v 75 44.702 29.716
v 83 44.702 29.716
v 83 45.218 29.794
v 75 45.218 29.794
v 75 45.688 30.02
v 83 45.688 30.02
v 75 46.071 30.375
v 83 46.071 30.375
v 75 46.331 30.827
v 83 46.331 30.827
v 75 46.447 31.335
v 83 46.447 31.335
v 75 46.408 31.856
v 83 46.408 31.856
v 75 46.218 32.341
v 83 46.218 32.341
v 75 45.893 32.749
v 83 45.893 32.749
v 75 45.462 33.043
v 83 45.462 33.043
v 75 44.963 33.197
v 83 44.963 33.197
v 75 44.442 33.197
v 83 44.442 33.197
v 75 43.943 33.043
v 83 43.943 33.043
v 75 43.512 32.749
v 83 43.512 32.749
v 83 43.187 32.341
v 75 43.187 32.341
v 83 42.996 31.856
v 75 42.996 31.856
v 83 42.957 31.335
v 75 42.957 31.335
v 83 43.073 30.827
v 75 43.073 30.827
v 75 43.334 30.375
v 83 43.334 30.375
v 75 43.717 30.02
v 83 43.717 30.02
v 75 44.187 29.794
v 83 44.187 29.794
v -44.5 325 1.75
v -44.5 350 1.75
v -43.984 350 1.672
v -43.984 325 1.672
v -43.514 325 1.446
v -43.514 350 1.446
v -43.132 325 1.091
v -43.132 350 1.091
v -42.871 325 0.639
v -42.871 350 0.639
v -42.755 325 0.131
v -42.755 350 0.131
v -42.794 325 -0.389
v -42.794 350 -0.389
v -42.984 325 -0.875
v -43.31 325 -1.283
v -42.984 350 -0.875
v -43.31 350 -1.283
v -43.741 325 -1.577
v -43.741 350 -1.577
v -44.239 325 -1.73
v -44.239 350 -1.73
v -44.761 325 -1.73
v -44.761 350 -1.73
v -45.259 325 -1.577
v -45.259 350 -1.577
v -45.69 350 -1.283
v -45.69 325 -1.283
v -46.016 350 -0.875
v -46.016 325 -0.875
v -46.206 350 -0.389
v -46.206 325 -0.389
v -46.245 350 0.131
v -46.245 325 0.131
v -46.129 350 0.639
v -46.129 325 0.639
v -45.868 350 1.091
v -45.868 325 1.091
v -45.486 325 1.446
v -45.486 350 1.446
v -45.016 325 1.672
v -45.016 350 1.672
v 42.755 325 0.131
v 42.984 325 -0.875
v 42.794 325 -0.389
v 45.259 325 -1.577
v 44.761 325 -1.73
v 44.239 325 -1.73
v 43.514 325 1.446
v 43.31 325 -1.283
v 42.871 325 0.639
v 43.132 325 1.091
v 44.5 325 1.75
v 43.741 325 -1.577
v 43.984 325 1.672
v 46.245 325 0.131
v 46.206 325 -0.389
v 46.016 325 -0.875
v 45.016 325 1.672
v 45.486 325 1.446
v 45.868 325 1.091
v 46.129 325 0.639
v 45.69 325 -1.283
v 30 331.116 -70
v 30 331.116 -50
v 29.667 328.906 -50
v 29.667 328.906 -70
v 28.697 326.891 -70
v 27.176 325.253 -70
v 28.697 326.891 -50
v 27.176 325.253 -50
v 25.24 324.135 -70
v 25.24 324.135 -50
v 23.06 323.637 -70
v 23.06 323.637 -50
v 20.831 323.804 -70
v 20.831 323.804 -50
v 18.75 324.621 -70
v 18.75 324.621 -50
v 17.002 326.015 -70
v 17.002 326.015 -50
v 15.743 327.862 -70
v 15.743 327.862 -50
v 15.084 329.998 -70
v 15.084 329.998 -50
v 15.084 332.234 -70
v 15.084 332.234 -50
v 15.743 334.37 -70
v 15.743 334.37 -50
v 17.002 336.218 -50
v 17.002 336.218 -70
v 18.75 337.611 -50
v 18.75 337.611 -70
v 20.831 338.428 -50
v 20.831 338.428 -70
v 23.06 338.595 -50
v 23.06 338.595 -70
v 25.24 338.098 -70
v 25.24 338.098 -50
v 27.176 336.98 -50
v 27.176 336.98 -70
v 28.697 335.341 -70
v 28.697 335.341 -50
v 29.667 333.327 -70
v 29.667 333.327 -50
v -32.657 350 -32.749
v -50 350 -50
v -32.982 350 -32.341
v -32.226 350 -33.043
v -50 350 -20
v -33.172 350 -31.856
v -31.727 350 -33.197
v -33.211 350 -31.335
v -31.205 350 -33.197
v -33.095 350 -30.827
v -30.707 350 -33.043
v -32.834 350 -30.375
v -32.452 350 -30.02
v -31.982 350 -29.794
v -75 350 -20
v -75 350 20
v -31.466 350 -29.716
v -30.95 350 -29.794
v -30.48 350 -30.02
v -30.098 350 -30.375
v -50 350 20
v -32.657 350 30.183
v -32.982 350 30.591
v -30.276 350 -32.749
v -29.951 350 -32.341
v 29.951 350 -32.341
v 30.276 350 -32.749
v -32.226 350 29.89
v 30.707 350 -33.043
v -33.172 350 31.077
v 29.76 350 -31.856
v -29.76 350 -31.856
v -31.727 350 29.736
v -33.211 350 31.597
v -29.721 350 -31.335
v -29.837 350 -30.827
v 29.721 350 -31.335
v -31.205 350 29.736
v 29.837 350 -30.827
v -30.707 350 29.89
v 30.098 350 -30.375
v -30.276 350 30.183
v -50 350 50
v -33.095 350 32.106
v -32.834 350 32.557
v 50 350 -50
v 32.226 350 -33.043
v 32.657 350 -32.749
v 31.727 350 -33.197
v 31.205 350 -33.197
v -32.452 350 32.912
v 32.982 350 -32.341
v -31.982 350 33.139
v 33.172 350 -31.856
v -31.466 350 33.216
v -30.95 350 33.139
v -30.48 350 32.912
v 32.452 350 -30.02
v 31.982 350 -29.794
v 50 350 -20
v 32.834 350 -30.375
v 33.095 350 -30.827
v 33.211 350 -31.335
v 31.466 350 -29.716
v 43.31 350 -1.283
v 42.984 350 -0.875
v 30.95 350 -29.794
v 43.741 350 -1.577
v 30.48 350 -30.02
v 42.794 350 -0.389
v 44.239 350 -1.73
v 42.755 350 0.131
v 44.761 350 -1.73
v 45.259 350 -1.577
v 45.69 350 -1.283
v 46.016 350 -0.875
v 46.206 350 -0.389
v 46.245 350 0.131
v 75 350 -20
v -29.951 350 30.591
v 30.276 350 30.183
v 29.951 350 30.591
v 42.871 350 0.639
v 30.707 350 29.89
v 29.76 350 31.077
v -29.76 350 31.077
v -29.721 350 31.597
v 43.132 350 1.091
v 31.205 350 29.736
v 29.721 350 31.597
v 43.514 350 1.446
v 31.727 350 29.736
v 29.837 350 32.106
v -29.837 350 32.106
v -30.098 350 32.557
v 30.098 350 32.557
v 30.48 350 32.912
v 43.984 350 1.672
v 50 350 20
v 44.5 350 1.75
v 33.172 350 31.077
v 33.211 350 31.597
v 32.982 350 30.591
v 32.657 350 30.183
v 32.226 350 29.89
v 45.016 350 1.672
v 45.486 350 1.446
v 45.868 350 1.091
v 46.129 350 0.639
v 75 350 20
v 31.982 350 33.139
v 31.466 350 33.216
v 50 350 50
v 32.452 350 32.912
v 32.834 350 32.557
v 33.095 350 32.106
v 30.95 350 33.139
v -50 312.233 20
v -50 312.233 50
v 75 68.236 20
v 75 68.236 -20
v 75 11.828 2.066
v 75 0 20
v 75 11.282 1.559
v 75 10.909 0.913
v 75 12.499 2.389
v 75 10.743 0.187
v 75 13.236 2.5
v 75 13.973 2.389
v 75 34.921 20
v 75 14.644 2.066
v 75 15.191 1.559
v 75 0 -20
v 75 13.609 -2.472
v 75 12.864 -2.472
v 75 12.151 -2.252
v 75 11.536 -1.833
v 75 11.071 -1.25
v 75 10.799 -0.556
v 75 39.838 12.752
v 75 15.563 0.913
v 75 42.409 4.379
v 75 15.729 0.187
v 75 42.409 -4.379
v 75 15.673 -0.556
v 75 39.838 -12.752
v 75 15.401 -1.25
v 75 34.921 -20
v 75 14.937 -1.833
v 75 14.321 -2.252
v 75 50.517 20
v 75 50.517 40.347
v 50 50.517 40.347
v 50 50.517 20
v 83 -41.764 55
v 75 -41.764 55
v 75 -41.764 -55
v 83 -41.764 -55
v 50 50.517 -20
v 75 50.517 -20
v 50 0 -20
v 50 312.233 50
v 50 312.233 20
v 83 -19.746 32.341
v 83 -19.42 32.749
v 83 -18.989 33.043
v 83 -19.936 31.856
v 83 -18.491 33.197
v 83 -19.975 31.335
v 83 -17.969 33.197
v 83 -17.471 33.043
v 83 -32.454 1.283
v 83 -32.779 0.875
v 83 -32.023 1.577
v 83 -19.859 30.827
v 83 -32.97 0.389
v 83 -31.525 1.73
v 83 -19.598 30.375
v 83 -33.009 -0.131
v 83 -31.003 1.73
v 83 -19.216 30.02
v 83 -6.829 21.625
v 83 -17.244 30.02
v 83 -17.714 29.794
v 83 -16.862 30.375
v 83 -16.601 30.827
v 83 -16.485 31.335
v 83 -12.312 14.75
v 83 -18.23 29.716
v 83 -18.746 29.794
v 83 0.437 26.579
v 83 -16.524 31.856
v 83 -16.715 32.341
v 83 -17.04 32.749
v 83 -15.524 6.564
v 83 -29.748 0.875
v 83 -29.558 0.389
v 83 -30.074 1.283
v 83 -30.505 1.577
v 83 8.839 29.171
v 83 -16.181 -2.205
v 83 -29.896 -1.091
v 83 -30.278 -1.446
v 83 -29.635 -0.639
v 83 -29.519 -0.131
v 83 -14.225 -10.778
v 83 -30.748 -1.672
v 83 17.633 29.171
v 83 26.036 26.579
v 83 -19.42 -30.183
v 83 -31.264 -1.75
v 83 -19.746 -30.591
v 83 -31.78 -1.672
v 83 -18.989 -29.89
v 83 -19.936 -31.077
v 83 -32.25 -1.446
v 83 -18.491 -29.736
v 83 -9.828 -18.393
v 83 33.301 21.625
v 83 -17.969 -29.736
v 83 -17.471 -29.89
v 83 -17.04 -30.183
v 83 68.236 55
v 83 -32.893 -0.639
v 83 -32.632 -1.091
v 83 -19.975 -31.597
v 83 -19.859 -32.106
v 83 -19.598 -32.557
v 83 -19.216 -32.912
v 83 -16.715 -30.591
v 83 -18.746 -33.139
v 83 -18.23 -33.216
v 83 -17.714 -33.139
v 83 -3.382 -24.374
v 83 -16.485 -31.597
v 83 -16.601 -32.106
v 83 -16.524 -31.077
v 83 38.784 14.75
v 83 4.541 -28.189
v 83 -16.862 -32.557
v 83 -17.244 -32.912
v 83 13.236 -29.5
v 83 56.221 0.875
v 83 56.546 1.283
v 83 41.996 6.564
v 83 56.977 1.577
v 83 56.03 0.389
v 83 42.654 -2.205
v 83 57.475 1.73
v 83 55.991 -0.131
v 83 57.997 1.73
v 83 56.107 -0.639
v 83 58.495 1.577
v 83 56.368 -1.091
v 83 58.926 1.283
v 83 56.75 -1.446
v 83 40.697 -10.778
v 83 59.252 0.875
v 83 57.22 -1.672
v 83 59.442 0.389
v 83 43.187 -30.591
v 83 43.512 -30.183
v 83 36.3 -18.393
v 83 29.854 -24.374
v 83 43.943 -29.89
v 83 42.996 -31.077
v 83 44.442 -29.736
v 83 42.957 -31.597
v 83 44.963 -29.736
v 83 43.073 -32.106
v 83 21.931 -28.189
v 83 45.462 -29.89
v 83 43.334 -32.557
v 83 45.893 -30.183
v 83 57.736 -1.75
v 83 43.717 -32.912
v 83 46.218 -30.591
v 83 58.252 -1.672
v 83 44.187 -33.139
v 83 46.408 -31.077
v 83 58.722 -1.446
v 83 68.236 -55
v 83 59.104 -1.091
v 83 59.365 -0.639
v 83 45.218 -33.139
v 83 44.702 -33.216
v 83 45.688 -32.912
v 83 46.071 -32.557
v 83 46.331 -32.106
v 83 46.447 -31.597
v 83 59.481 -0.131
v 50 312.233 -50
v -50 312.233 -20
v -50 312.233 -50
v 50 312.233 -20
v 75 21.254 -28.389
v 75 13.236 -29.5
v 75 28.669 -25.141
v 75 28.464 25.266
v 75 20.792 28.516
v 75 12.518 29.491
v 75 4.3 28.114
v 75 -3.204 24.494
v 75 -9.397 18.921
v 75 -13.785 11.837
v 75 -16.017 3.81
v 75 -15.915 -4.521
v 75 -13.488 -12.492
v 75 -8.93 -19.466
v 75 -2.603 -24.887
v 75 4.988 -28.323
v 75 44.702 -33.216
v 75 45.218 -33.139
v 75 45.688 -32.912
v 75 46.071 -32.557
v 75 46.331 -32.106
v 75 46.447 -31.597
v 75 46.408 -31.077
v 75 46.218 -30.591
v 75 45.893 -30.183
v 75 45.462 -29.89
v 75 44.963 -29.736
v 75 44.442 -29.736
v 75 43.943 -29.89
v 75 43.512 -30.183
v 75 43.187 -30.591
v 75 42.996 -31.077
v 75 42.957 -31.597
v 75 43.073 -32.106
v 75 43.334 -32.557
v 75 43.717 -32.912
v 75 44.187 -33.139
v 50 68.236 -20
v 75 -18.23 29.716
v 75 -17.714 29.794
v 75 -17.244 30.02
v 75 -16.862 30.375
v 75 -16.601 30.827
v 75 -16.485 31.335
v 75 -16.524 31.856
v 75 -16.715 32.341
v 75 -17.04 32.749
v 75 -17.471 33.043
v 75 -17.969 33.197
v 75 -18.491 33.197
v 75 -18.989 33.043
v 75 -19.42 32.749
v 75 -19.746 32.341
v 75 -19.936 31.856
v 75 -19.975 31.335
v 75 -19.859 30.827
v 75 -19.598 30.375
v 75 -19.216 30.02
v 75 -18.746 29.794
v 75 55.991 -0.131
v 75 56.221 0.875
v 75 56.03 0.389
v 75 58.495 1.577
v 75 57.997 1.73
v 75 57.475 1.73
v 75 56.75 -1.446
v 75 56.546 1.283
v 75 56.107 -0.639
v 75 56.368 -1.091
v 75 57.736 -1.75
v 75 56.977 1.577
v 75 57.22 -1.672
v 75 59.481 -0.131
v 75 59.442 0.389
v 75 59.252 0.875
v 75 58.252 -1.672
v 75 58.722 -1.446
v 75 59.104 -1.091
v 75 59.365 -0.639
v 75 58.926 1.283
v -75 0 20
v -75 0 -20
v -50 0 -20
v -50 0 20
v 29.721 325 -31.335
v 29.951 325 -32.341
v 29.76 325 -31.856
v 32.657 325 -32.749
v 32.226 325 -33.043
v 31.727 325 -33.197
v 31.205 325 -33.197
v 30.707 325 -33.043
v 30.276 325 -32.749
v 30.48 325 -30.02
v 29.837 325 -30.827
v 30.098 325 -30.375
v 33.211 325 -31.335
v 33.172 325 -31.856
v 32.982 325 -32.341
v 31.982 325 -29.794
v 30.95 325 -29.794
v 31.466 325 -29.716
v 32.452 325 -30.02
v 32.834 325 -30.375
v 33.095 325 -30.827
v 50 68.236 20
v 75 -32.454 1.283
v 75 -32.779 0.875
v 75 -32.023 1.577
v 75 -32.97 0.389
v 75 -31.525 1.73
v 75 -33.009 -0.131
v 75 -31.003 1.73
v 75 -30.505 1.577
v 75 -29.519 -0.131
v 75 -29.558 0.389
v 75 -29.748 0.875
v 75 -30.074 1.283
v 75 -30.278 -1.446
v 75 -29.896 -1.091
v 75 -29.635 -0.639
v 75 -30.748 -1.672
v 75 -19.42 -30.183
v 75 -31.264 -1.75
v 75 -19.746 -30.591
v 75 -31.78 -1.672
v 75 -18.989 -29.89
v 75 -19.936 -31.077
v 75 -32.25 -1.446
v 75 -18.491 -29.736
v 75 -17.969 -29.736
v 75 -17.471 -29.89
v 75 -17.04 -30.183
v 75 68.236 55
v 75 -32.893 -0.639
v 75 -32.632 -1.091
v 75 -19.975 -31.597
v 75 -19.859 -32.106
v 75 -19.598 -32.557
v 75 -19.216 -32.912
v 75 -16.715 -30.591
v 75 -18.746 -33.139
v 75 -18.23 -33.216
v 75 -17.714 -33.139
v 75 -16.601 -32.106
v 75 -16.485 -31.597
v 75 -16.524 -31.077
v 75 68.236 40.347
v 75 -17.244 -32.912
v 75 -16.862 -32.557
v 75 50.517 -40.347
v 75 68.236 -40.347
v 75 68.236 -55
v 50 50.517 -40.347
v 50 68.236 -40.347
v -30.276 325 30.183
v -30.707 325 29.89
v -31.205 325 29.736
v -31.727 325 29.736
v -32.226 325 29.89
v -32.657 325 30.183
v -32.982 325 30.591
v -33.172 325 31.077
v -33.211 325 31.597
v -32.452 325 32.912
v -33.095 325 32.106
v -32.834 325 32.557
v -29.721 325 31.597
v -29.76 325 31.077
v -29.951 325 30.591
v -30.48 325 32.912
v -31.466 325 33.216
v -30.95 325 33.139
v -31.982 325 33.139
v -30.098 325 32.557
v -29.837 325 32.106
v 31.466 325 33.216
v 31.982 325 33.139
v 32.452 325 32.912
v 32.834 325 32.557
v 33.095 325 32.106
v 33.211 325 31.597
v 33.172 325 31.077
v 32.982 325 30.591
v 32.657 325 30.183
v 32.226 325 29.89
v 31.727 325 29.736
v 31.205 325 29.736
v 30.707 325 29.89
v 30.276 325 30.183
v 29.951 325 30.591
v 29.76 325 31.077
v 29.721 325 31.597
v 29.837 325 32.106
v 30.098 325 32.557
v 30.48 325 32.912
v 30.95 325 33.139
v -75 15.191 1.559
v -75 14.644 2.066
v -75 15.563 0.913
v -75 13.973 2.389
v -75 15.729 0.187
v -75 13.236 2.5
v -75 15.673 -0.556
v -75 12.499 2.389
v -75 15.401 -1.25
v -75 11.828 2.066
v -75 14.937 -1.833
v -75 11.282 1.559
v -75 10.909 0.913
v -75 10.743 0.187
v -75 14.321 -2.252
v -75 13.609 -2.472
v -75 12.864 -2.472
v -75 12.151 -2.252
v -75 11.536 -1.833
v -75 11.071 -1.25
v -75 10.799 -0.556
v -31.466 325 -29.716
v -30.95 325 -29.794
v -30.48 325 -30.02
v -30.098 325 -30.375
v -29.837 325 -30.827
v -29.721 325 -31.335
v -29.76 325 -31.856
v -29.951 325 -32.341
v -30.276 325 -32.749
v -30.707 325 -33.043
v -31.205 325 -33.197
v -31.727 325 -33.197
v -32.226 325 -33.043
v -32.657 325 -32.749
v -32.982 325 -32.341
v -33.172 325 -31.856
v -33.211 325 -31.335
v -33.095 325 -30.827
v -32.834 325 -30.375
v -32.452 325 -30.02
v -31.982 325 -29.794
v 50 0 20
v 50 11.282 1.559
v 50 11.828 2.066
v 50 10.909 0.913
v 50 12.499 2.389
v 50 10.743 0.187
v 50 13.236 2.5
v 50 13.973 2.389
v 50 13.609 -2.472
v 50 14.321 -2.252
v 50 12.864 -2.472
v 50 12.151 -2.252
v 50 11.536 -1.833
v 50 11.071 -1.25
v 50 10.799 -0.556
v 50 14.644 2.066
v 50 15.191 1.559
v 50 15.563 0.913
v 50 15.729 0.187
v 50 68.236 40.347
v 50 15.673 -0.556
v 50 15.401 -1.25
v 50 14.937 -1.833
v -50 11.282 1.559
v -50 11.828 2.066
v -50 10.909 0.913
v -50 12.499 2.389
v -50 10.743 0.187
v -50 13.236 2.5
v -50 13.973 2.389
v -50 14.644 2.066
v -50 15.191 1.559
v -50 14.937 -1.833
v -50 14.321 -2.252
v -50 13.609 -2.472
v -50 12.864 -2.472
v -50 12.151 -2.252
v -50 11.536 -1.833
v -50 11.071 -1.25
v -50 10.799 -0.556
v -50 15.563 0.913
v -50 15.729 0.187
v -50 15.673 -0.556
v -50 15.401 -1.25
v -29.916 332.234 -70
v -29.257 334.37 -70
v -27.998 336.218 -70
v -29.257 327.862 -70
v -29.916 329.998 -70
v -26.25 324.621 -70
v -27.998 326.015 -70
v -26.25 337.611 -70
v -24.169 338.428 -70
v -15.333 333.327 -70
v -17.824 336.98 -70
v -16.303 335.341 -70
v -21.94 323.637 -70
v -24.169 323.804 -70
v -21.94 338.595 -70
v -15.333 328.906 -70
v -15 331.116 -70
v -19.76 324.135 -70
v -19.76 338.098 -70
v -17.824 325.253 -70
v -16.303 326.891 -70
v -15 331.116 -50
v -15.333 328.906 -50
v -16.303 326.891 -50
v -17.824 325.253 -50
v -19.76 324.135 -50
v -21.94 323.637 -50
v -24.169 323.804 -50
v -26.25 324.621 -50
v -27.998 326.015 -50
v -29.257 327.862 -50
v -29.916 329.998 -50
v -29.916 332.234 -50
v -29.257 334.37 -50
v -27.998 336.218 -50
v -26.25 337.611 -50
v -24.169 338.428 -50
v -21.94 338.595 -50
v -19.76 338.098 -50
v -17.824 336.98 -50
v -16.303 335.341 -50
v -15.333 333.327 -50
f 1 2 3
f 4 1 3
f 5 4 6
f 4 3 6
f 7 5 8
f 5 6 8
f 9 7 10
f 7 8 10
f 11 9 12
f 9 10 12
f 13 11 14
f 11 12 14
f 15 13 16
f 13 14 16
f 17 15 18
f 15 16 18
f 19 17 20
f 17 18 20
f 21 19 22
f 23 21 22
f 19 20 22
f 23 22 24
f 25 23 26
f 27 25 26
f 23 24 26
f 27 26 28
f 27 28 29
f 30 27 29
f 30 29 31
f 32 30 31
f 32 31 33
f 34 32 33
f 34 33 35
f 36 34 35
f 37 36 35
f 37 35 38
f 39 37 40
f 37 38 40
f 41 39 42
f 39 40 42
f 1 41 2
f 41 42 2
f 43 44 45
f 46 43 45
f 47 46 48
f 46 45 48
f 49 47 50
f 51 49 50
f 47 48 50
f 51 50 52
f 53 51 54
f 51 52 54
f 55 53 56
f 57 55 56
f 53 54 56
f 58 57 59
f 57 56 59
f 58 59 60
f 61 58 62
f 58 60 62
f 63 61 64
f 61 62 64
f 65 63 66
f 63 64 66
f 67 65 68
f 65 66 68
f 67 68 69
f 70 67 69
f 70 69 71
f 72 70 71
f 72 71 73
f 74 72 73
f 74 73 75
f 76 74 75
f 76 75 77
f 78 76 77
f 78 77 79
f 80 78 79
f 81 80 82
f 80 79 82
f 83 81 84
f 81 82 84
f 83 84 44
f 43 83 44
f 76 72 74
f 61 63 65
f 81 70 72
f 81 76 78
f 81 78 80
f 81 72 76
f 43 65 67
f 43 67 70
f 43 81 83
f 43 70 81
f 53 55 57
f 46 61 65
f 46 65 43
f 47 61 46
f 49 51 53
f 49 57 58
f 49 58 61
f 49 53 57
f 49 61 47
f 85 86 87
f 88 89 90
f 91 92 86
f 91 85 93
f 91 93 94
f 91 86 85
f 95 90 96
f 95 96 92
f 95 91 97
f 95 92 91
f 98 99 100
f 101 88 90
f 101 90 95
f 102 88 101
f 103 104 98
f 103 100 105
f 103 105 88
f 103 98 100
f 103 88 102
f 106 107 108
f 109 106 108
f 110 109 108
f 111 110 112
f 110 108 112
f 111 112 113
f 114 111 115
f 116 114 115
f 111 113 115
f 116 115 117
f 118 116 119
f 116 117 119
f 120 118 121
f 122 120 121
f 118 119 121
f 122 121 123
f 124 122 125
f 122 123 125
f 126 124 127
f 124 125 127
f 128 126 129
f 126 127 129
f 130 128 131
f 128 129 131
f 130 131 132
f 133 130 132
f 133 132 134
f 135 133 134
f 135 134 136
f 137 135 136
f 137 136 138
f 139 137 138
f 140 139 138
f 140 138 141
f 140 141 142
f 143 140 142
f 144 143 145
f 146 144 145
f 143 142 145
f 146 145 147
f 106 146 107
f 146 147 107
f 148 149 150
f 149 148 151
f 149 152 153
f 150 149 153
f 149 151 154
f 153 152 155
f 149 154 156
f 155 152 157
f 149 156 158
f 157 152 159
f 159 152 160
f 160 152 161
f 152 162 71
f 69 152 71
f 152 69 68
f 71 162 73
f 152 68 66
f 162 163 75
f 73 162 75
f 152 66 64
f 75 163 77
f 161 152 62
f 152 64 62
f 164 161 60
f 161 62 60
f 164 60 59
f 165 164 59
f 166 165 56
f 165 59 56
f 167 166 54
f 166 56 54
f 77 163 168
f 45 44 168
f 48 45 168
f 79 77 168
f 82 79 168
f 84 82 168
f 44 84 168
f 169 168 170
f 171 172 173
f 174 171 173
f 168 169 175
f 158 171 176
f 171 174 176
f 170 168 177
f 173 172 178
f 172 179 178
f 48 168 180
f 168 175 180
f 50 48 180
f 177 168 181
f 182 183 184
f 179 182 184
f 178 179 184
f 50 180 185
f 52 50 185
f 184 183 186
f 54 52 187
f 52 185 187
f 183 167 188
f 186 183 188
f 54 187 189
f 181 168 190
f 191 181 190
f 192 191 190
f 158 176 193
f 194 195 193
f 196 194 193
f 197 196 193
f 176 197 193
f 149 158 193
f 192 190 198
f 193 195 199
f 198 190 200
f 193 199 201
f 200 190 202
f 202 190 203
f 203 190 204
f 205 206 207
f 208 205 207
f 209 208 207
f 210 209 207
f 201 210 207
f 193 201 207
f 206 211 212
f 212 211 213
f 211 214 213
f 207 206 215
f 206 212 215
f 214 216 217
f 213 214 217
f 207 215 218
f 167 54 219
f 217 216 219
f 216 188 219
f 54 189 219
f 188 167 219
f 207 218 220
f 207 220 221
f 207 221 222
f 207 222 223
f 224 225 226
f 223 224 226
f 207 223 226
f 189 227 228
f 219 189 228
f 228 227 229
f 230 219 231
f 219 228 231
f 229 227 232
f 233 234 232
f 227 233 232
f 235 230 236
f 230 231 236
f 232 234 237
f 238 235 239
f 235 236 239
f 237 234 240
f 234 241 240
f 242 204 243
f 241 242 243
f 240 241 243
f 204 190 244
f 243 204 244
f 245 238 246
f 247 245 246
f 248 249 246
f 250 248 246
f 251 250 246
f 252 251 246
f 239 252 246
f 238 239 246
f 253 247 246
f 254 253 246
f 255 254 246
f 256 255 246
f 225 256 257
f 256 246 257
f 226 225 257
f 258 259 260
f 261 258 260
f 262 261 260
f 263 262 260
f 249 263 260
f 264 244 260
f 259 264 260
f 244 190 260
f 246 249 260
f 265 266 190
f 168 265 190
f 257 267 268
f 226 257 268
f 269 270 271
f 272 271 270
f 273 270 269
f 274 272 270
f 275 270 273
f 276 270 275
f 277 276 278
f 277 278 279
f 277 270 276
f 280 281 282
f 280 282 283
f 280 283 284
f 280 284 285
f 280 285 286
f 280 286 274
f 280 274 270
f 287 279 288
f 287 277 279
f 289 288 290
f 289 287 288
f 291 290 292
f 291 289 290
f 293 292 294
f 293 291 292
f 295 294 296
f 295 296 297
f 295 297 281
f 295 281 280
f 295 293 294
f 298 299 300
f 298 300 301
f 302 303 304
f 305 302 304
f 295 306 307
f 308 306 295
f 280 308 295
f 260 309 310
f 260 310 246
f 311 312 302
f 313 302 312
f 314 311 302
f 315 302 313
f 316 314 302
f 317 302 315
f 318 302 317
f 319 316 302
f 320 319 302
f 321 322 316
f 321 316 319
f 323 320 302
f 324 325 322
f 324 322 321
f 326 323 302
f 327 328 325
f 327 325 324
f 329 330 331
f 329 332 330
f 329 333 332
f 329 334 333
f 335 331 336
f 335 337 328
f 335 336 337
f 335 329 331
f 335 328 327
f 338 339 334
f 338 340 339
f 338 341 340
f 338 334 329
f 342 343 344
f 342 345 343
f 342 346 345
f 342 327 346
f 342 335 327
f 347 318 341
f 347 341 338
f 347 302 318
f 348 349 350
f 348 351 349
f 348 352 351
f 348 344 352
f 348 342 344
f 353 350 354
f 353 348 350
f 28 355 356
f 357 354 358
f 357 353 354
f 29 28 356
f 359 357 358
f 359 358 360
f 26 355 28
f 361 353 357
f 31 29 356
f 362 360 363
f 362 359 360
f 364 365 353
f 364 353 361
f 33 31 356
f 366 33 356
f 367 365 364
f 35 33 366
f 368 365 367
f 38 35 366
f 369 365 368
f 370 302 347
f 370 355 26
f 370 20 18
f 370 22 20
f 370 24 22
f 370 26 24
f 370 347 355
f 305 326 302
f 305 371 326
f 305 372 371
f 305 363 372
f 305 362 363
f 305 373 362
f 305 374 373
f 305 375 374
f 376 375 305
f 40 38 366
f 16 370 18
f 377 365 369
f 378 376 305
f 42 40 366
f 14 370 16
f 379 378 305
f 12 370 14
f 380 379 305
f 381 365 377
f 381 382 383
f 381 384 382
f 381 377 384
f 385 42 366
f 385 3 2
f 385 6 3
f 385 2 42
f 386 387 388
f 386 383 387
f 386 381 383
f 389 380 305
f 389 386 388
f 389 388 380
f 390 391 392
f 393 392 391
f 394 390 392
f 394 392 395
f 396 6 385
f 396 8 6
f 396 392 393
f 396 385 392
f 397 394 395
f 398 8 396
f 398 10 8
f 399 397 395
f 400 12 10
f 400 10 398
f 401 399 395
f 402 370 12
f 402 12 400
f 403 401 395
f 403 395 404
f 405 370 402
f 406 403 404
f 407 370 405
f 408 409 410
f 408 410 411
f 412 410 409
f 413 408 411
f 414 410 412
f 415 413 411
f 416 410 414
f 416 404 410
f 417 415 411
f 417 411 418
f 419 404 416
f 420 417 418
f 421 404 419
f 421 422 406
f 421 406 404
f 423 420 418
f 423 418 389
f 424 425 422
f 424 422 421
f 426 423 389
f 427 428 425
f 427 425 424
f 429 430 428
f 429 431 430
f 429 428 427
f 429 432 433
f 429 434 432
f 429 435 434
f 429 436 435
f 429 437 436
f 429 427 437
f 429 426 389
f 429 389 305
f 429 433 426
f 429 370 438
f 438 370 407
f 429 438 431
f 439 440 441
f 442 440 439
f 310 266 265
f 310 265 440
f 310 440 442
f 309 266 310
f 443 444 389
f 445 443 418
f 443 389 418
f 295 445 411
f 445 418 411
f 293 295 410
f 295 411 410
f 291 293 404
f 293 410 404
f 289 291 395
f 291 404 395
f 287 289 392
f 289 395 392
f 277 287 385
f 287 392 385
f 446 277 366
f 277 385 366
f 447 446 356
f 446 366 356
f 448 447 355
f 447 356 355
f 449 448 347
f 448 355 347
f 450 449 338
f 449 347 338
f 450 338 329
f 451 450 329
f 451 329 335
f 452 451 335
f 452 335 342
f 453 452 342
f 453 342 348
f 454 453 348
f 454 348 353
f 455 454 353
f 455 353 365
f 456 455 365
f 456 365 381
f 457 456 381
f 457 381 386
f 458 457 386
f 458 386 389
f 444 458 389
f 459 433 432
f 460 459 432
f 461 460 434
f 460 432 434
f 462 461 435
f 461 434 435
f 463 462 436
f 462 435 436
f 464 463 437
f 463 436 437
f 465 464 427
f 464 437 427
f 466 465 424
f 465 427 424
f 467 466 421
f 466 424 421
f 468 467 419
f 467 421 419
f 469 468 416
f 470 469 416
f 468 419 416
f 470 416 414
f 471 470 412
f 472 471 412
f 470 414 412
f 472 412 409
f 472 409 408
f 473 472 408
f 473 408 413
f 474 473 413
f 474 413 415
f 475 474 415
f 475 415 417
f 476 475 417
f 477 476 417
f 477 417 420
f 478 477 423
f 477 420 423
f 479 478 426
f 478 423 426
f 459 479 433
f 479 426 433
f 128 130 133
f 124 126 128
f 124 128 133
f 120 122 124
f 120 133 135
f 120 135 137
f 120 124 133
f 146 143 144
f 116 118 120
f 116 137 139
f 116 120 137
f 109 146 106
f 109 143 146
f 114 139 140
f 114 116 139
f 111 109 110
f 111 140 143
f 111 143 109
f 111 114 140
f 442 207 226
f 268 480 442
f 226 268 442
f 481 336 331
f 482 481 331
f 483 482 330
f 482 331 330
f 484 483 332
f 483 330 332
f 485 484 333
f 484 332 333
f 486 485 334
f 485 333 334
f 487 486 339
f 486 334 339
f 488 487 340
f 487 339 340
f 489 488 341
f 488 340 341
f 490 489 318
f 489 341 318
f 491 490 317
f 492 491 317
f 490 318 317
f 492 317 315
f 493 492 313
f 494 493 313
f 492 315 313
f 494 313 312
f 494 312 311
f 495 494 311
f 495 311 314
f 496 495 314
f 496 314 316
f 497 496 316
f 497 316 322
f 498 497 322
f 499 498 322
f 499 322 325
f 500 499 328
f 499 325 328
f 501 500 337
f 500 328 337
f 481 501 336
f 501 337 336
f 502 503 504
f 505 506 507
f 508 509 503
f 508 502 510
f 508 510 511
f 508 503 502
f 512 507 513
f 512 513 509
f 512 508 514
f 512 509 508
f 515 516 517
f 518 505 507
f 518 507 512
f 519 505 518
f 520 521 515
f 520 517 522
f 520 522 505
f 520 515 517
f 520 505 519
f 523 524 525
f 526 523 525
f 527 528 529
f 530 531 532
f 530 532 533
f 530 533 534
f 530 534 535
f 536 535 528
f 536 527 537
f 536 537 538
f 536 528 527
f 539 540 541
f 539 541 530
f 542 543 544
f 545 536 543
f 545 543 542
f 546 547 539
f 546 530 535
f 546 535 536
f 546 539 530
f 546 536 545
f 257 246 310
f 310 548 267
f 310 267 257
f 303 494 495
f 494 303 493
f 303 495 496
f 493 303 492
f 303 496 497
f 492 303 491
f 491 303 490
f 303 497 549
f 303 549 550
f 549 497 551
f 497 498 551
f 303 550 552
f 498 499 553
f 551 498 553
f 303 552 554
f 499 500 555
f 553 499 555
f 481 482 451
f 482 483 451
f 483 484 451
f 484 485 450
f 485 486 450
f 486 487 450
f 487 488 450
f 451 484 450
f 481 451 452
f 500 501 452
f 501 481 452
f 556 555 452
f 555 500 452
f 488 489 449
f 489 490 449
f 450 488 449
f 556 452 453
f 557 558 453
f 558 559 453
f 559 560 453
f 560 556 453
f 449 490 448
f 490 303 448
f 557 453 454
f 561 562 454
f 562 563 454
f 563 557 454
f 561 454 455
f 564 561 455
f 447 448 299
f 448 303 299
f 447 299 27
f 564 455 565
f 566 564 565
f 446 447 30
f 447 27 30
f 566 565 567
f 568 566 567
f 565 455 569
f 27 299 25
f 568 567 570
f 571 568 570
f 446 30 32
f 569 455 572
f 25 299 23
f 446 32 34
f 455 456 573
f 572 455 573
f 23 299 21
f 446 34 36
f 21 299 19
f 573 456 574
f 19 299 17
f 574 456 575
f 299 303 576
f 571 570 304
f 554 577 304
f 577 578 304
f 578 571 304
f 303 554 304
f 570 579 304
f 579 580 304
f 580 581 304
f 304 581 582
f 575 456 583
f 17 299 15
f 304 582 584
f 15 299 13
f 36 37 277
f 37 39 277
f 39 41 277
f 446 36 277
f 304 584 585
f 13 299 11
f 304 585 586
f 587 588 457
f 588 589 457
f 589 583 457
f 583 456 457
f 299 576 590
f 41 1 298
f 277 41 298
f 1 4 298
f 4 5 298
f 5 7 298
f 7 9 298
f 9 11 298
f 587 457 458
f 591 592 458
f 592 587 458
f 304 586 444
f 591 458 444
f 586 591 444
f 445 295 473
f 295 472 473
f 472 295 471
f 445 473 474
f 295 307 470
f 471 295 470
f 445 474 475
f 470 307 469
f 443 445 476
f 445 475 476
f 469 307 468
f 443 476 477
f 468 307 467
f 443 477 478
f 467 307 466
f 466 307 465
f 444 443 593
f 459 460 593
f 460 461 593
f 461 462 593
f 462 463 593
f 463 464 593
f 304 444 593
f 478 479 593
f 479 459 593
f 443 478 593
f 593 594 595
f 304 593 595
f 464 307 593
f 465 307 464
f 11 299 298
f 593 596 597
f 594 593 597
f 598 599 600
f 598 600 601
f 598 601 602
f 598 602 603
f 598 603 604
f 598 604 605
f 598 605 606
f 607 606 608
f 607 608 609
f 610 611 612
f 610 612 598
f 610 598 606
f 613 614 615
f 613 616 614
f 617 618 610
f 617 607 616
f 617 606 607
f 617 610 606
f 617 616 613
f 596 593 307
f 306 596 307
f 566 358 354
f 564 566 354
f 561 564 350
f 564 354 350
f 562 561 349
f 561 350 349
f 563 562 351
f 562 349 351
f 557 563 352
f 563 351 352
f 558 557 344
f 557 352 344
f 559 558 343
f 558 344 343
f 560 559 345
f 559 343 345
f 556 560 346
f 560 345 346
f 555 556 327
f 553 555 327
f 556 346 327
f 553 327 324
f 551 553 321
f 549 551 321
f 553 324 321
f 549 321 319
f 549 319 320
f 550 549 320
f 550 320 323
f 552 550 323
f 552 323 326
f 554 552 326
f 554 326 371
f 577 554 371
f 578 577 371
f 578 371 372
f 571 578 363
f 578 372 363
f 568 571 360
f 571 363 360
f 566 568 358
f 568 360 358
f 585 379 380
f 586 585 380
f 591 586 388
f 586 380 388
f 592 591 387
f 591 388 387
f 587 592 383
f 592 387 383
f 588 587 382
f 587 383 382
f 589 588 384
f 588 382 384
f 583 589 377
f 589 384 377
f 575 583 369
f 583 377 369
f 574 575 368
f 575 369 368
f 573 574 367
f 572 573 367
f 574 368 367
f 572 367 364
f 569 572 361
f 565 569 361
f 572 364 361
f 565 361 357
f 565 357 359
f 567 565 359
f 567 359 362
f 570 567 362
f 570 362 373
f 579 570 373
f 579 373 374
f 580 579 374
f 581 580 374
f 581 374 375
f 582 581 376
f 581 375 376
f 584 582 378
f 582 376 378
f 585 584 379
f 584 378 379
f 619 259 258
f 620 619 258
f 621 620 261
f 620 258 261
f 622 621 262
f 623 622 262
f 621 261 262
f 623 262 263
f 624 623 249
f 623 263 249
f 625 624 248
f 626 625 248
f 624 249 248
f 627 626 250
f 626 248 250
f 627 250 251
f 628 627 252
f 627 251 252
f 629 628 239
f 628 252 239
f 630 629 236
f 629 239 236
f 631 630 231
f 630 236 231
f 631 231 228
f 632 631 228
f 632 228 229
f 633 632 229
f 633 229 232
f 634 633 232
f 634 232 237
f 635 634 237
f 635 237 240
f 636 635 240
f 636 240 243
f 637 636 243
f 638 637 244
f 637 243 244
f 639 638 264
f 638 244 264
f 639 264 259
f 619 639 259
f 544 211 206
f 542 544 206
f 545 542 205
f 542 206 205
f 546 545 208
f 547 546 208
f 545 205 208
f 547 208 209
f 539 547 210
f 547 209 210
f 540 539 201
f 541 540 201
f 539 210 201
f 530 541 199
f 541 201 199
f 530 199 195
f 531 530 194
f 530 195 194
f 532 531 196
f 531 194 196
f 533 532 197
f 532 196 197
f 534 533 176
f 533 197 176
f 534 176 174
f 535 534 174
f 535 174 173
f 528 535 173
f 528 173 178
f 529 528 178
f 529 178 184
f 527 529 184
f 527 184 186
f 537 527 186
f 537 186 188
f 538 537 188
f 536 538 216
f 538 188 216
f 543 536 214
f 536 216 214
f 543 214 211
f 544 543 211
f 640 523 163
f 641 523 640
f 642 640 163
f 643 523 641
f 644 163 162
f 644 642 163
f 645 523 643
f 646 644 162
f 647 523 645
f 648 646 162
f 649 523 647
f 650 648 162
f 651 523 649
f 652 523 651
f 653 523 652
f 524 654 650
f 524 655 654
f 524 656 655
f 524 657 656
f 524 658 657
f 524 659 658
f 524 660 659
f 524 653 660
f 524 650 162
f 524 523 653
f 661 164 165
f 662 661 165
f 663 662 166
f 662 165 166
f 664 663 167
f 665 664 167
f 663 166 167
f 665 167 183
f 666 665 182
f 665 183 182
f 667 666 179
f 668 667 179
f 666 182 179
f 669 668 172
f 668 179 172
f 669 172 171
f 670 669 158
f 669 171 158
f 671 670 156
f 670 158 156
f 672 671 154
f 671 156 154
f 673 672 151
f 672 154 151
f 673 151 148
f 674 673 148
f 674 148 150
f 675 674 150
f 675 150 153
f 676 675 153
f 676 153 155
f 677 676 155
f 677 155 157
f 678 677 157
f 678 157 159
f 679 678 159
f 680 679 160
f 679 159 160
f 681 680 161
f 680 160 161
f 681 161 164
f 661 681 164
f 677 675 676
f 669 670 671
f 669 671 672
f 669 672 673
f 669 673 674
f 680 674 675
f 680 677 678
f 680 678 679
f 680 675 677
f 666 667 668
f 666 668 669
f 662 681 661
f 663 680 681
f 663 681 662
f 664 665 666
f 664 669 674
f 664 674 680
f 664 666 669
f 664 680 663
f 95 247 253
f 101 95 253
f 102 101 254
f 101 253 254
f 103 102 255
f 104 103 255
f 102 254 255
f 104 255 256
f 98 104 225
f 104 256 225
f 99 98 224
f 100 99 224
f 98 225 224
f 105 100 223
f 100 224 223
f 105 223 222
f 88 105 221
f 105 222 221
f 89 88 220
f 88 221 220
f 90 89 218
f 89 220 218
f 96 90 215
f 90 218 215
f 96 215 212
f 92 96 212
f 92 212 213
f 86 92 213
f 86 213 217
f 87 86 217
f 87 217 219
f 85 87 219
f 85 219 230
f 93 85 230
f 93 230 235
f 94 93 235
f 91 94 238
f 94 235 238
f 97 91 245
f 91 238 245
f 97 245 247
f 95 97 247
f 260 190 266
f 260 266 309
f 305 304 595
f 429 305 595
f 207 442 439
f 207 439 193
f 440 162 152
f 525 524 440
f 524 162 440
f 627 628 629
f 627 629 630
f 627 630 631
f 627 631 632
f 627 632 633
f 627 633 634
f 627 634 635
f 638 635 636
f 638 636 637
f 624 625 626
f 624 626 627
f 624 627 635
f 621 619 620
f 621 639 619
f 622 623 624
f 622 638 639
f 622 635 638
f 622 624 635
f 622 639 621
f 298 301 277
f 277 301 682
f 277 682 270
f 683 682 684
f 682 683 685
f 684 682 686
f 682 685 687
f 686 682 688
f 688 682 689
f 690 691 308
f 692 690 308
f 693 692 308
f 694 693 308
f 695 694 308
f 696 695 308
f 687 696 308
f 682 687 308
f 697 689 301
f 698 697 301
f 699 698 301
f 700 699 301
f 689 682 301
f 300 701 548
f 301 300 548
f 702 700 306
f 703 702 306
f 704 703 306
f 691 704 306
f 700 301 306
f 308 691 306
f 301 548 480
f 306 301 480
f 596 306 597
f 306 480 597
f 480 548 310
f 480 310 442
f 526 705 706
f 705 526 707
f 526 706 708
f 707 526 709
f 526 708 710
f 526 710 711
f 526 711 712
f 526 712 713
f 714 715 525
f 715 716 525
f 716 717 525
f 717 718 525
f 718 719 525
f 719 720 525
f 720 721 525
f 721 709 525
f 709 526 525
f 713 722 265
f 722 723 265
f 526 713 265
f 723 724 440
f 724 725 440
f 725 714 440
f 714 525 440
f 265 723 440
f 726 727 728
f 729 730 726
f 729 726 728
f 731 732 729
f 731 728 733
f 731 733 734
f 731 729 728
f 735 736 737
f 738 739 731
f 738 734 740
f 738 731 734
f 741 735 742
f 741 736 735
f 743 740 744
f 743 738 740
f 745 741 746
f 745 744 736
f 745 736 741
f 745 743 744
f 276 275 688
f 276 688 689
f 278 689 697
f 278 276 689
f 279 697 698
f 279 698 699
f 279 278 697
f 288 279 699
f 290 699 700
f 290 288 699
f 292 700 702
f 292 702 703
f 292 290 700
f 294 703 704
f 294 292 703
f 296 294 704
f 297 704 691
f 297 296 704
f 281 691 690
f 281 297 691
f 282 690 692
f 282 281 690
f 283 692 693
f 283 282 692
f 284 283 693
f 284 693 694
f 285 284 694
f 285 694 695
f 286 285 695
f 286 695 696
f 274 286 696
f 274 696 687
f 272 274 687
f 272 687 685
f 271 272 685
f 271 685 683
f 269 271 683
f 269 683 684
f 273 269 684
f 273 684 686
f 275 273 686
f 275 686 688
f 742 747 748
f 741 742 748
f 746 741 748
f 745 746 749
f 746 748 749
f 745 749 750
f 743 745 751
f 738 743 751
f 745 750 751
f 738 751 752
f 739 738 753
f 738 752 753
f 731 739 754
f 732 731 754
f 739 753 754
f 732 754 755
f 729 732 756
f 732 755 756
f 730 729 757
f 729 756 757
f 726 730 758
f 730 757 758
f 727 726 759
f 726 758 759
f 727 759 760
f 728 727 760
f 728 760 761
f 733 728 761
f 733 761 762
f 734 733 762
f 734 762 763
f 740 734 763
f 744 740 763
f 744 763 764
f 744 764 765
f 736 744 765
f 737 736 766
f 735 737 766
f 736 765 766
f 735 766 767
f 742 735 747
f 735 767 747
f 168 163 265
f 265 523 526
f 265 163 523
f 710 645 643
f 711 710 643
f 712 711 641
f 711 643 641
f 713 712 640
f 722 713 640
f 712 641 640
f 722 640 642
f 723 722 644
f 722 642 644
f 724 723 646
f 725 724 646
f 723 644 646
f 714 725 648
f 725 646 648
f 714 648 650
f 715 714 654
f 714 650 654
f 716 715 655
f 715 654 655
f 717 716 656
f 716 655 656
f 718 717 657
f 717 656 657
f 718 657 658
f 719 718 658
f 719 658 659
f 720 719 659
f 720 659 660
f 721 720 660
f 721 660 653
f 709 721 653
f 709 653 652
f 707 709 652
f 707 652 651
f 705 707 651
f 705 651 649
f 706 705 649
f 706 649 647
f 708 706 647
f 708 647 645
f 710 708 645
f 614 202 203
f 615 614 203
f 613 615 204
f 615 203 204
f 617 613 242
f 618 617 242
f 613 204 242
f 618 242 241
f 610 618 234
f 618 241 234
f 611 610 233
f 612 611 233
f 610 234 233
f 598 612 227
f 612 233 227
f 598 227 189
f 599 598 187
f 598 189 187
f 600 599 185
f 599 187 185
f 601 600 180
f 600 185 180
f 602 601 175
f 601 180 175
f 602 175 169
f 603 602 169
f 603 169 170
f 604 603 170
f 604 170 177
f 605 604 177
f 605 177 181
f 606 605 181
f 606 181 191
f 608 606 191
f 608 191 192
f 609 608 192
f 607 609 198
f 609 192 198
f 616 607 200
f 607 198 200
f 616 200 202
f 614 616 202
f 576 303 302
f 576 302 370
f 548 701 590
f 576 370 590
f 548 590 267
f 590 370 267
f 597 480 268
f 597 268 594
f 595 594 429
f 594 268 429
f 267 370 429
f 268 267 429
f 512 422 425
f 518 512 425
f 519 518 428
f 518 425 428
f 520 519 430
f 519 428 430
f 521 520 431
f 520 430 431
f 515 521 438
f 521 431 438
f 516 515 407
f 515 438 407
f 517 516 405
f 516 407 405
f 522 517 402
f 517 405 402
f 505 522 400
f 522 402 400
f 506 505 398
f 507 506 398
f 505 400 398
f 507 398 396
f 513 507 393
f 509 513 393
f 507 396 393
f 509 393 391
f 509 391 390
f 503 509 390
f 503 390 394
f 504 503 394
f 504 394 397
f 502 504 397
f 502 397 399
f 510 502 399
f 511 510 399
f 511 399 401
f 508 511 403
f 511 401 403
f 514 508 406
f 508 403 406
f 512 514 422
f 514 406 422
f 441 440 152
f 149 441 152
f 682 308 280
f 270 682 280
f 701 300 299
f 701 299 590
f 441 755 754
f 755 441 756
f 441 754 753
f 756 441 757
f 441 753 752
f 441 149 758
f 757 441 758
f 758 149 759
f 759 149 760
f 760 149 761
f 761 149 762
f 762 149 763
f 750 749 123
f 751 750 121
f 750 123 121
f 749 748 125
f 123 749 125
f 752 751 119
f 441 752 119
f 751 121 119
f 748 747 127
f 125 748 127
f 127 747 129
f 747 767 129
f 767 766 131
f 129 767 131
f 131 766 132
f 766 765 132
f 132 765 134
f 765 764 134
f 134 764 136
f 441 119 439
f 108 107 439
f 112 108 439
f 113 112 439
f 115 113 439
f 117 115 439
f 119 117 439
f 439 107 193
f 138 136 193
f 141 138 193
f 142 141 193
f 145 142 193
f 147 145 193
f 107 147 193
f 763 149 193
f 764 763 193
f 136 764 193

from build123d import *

# Parameters (mm, degrees)
SKETCH_1_W          = 150
SKETCH_1_H          = 40
EXTRUDE_1_DEPTH     = 350
CUT_EXTRUDE_3_REACH = 362.174
SKETCH_7_W          = 50
SKETCH_7_H          = 312.232580329
CUT_EXTRUDE_4_REACH = 383.314
SKETCH_8_R          = 2.5
EXTRUDE_START       = -20
SKETCH_12_W         = 100
SKETCH_12_H         = 37.767419671
EXTRUDE_2_DEPTH     = 50
SKETCH_14_R         = 1.75
CUT_EXTRUDE_7_DEPTH = 25
SKETCH_16_R         = 7.5
EXTRUDE_3_DEPTH     = 20
SKETCH_18_W         = 110
SKETCH_18_H         = 110
EXTRUDE_4_DEPTH     = 8
SKETCH_19_R         = 1.75
CUT_EXTRUDE_8_DEPTH = 8
SKETCH_20_R         = 29.5
CUT_EXTRUDE_9_DEPTH = 8
SKETCH_21_W         = 20.347444736
SKETCH_21_H         = 17.71885043
EXTRUDE_5_DEPTH     = 25


with BuildPart() as part:
    # 草图1 → 凸台-拉伸1 (new body)
    with BuildSketch(Plane(origin=(0, 0, 0), x_dir=(1, 0, 0), z_dir=(0, 1, 0))):
        Rectangle(SKETCH_1_W, SKETCH_1_H)
    extrude(amount=EXTRUDE_1_DEPTH)

    # 草图7 → 切除-拉伸3 (cut, up to next)
    with BuildSketch(Plane(origin=(0, 0, -20), x_dir=(-1, 0, 0), z_dir=(0, 0, -1)), mode=Mode.PRIVATE) as cut_extrude_3_sk1:
        with Locations((-25, 156.116290165)):
            Rectangle(SKETCH_7_W, SKETCH_7_H)
    cut_extrude_3_tool1 = extrude(cut_extrude_3_sk1.sketch, amount=-CUT_EXTRUDE_3_REACH, mode=Mode.PRIVATE) & part.part
    cut_extrude_3 = cut_extrude_3_tool1.solids().sort_by_distance((25, 156.11629, -20))[0]
    add(cut_extrude_3, mode=Mode.SUBTRACT)

    # 镜向2: 切除-拉伸3 across plane
    add(cut_extrude_3.mirror(Plane(origin=(0, 0, 0), x_dir=(0, 0, 1), z_dir=(1, 0, 0))), mode=Mode.SUBTRACT)

    # 草图8 → 切除-拉伸4 (cut, up to next)
    with BuildSketch(Plane.ZY.offset(75), mode=Mode.PRIVATE) as cut_extrude_4_sk1:
        with Locations((0, 13.236112216)):
            Circle(SKETCH_8_R)
    cut_extrude_4_tool1 = extrude(cut_extrude_4_sk1.sketch, amount=-CUT_EXTRUDE_4_REACH, mode=Mode.PRIVATE) & part.part
    cut_extrude_4 = cut_extrude_4_tool1.solids().sort_by_distance((-75, 13.236112, 0))[0]
    add(cut_extrude_4, mode=Mode.SUBTRACT)

    # 镜向3: 切除-拉伸4 across plane
    add(cut_extrude_4.mirror(Plane(origin=(0, 0, 0), x_dir=(0, 0, 1), z_dir=(1, 0, 0))), mode=Mode.SUBTRACT)

    # 草图12 → 凸台-拉伸2 (add, symmetric)
    with BuildSketch(Plane.XY.offset(20).offset(EXTRUDE_START)):
        with Locations((0, 331.116290165)):
            Rectangle(SKETCH_12_W, SKETCH_12_H)
    extrude(amount=EXTRUDE_2_DEPTH, both=True)

    # 草图14 → 切除-拉伸7 (cut)
    with BuildSketch(Plane(origin=(0, 350, 0), x_dir=(1, 0, 0), z_dir=(0, 1, 0))):
        with Locations(Location((-31.466251763, -31.466251763, 0), (0, 0, 270))):
            Circle(SKETCH_14_R)
        with Locations(Location((-44.5, 0, 0), (0, 0, 270))):
            Circle(SKETCH_14_R)
        with Locations(Location((-31.466251763, 31.466251763, 0), (0, 0, 270))):
            Circle(SKETCH_14_R)
        with Locations(Location((31.466251763, 31.466251763, 0), (0, 0, 270))):
            Circle(SKETCH_14_R)
        with Locations(Location((44.5, 0, 0), (0, 0, 270))):
            Circle(SKETCH_14_R)
        with Locations(Location((31.466251763, -31.466251763, 0), (0, 0, 270))):
            Circle(SKETCH_14_R)
    extrude(amount=-CUT_EXTRUDE_7_DEPTH, mode=Mode.SUBTRACT)

    # 草图16 → 凸台-拉伸3 (add)
    with BuildSketch(Plane(origin=(0, 0, -50), x_dir=(-1, 0, 0), z_dir=(0, 0, -1))):
        with Locations(Location((-22.5, 331.116290164, 0), (0, 0, 180))):
            Circle(SKETCH_16_R)
        with Locations(Location((22.5, 331.116290164, 0), (0, 0, 180))):
            Circle(SKETCH_16_R)
    extrude(amount=EXTRUDE_3_DEPTH)

    # 草图18 → 凸台-拉伸4 (add)
    with BuildSketch(Plane(origin=(75, 0, 0), x_dir=(0, 0, -1), z_dir=(1, 0, 0))):
        with Locations((0, 13.236112216)):
            Rectangle(SKETCH_18_W, SKETCH_18_H)
    extrude(amount=EXTRUDE_4_DEPTH)

    # 草图19 → 切除-拉伸8 (cut)
    with BuildSketch(Plane(origin=(83, 0, 0), x_dir=(0, 0, -1), z_dir=(1, 0, 0))):
        with Locations((0, -31.263887784)):
            Circle(SKETCH_19_R)
        with Locations((-31.466251763, -18.230139547)):
            Circle(SKETCH_19_R)
        with Locations((-31.466251763, 44.702363979)):
            Circle(SKETCH_19_R)
        with Locations((0, 57.736112216)):
            Circle(SKETCH_19_R)
        with Locations((31.466251763, 44.702363979)):
            Circle(SKETCH_19_R)
        with Locations((31.466251763, -18.230139547)):
            Circle(SKETCH_19_R)
    extrude(amount=-CUT_EXTRUDE_8_DEPTH, mode=Mode.SUBTRACT)

    # 草图20 → 切除-拉伸9 (cut)
    with BuildSketch(Plane(origin=(83, 0, 0), x_dir=(0, 0, -1), z_dir=(1, 0, 0))):
        with Locations((0, 13.236112216)):
            Circle(SKETCH_20_R)
    extrude(amount=-CUT_EXTRUDE_9_DEPTH, mode=Mode.SUBTRACT)

    # 草图21 → 凸台-拉伸5 (add)
    with BuildSketch(Plane.ZY.offset(-75)):
        with Locations((-30.173722368, 59.376687001)):
            Rectangle(SKETCH_21_W, SKETCH_21_H)
    extrude_5 = extrude(amount=EXTRUDE_5_DEPTH)

    # 镜向4: 凸台-拉伸5 across plane
    add(extrude_5.mirror(Plane.XY))


solid = part.part
